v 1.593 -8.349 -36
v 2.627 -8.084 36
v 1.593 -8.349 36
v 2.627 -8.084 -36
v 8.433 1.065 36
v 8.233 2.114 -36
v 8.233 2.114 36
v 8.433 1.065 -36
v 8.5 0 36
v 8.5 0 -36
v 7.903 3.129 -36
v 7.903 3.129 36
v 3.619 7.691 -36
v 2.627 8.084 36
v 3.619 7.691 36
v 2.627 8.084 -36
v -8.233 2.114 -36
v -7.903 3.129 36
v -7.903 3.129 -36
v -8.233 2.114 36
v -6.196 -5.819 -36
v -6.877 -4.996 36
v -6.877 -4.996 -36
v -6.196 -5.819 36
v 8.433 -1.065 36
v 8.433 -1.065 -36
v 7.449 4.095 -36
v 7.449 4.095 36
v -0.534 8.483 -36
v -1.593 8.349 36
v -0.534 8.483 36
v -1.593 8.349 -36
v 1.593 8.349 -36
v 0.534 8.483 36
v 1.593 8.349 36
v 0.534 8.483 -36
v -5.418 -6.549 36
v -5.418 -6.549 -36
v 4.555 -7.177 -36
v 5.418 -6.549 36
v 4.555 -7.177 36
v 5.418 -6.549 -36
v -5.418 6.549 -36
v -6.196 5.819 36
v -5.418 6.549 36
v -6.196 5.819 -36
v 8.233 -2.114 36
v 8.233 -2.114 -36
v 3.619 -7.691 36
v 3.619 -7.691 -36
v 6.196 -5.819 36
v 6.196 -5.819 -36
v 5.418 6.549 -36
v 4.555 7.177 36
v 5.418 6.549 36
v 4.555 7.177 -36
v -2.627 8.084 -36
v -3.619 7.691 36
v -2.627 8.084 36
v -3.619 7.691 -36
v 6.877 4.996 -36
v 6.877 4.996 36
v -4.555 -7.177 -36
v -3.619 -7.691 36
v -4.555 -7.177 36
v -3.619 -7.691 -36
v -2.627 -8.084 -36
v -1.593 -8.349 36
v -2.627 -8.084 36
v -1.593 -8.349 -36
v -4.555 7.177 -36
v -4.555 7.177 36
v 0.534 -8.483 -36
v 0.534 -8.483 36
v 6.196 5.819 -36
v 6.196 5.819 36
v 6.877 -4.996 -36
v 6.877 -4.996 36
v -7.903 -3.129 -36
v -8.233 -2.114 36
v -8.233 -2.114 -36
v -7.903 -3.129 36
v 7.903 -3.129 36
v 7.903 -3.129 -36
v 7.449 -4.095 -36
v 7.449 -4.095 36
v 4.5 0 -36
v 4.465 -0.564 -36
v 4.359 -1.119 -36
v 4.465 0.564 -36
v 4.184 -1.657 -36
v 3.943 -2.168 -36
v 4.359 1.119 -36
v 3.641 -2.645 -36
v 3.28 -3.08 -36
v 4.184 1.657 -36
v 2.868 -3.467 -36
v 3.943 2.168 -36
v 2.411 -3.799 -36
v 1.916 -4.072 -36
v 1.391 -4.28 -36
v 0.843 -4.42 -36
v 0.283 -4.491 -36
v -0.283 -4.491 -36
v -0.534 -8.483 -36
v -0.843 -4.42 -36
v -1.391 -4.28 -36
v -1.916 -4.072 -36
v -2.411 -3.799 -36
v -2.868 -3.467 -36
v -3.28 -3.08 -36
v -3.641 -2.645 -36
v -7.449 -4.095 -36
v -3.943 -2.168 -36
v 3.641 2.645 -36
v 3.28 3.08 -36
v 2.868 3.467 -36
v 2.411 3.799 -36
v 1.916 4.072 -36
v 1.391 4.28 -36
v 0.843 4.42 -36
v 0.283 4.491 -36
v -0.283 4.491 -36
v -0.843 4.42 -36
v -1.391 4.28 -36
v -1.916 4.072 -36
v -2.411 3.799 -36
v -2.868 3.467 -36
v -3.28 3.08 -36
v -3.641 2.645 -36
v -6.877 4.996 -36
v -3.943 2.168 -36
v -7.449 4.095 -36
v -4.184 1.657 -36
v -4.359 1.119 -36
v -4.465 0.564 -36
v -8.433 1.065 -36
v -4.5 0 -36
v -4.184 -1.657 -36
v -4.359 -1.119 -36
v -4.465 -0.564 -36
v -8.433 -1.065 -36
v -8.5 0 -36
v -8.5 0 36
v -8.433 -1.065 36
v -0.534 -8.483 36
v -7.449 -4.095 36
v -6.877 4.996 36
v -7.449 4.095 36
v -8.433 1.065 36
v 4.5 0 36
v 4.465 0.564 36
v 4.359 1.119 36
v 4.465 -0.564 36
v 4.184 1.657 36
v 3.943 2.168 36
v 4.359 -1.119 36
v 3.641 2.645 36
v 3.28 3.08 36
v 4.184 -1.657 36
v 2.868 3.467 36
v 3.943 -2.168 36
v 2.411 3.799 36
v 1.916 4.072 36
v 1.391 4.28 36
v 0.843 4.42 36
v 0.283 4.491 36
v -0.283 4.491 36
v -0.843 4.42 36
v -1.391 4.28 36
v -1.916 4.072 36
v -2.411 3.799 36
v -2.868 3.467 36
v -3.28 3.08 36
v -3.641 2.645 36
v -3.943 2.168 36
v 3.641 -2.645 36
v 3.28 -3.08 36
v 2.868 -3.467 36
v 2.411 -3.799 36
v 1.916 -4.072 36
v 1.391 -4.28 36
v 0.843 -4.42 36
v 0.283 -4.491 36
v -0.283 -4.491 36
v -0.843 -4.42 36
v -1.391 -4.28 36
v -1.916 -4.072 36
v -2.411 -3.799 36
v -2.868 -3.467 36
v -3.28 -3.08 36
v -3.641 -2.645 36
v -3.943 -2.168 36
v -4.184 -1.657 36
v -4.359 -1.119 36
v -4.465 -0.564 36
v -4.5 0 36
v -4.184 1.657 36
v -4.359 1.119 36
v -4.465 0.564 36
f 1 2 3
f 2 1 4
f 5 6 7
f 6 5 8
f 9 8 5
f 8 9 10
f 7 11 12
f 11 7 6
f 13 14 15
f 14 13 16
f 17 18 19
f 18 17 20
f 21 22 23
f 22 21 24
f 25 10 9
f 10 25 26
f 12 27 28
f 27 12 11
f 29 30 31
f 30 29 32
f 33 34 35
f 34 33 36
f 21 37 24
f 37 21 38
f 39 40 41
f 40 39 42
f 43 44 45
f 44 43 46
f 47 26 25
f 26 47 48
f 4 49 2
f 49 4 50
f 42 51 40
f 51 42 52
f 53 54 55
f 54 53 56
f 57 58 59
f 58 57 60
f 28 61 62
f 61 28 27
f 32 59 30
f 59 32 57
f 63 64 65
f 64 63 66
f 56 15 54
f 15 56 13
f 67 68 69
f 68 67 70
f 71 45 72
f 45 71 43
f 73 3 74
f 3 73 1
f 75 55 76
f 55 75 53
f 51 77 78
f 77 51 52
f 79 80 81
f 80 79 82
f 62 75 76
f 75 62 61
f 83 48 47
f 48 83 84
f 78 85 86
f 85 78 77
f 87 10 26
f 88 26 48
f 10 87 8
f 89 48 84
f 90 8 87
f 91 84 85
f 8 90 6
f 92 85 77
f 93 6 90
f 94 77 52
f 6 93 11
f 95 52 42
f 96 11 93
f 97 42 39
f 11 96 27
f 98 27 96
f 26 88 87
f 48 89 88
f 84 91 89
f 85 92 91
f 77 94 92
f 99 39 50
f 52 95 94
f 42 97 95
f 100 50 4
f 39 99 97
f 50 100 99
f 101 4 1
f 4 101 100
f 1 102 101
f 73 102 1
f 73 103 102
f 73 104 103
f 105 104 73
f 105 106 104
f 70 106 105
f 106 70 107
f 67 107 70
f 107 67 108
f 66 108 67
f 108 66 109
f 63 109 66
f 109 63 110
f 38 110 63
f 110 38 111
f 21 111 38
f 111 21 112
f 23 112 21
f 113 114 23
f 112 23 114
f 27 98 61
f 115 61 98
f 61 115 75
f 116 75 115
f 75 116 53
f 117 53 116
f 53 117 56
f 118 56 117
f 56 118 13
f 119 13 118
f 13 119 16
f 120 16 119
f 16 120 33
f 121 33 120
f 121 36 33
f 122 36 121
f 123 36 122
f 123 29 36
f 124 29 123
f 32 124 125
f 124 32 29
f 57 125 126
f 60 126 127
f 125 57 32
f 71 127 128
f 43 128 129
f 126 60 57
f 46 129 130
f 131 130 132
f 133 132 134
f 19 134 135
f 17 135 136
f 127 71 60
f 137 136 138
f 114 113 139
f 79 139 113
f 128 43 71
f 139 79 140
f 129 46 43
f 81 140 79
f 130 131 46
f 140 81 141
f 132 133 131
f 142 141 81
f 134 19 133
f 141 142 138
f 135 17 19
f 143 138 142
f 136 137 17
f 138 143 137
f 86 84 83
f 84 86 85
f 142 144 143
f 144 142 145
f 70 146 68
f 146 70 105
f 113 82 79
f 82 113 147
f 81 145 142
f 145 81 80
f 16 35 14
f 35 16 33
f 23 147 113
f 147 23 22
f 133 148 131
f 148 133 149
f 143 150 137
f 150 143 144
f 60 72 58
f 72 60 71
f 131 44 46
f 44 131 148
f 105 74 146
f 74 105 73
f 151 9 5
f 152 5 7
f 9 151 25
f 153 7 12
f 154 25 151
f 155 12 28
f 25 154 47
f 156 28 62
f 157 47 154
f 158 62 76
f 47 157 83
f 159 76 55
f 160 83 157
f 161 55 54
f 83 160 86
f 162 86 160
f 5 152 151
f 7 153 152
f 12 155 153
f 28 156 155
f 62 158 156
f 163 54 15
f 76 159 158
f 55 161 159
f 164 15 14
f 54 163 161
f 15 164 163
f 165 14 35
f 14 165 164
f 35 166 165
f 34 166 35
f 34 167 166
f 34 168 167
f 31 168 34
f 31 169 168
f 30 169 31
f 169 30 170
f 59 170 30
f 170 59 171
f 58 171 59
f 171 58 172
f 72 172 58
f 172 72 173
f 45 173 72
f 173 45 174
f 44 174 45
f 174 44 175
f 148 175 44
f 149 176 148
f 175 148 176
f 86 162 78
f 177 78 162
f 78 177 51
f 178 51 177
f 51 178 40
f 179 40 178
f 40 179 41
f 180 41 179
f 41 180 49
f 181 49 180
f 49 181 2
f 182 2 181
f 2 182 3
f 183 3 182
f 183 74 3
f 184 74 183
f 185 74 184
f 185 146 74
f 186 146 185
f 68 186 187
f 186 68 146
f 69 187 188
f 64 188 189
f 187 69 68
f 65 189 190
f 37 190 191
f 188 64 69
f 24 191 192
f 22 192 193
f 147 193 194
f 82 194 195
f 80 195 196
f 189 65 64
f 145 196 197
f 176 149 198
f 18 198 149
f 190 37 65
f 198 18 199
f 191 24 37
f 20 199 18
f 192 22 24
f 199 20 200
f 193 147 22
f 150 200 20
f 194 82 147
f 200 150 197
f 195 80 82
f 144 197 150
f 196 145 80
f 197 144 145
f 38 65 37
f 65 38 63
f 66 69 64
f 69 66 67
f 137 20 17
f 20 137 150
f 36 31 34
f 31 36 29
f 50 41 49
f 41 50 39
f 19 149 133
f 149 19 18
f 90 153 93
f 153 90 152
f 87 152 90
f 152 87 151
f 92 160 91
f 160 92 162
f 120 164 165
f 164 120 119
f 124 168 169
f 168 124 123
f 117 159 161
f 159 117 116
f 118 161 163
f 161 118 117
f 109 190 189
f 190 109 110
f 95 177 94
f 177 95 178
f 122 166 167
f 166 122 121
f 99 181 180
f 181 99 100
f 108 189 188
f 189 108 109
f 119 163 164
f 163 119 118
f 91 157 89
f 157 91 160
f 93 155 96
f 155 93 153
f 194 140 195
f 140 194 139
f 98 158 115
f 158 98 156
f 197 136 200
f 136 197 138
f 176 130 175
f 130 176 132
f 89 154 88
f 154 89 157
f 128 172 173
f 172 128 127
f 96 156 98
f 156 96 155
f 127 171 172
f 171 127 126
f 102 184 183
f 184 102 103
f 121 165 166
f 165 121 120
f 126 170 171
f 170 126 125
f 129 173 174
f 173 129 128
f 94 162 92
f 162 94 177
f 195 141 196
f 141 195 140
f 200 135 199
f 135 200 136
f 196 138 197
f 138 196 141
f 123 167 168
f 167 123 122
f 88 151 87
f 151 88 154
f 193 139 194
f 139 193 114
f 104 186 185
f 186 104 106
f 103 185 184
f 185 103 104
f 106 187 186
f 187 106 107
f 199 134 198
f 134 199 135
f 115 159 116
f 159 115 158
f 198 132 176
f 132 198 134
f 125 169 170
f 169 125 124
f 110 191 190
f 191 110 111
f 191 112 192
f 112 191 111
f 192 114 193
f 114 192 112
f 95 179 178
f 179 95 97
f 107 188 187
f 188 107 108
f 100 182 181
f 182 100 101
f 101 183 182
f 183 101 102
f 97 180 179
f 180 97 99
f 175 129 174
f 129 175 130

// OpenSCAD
$fn = 50;


difference() {
	union() {
		translate(v = [0, 0, -36.0000000000]) {
			cylinder(h = 72, r = 8.5000000000);
		}
	}
	union() {
		translate(v = [0, 0, -100.0000000000]) {
			cylinder(h = 200, r = 4.5000000000);
		}
	}
}
